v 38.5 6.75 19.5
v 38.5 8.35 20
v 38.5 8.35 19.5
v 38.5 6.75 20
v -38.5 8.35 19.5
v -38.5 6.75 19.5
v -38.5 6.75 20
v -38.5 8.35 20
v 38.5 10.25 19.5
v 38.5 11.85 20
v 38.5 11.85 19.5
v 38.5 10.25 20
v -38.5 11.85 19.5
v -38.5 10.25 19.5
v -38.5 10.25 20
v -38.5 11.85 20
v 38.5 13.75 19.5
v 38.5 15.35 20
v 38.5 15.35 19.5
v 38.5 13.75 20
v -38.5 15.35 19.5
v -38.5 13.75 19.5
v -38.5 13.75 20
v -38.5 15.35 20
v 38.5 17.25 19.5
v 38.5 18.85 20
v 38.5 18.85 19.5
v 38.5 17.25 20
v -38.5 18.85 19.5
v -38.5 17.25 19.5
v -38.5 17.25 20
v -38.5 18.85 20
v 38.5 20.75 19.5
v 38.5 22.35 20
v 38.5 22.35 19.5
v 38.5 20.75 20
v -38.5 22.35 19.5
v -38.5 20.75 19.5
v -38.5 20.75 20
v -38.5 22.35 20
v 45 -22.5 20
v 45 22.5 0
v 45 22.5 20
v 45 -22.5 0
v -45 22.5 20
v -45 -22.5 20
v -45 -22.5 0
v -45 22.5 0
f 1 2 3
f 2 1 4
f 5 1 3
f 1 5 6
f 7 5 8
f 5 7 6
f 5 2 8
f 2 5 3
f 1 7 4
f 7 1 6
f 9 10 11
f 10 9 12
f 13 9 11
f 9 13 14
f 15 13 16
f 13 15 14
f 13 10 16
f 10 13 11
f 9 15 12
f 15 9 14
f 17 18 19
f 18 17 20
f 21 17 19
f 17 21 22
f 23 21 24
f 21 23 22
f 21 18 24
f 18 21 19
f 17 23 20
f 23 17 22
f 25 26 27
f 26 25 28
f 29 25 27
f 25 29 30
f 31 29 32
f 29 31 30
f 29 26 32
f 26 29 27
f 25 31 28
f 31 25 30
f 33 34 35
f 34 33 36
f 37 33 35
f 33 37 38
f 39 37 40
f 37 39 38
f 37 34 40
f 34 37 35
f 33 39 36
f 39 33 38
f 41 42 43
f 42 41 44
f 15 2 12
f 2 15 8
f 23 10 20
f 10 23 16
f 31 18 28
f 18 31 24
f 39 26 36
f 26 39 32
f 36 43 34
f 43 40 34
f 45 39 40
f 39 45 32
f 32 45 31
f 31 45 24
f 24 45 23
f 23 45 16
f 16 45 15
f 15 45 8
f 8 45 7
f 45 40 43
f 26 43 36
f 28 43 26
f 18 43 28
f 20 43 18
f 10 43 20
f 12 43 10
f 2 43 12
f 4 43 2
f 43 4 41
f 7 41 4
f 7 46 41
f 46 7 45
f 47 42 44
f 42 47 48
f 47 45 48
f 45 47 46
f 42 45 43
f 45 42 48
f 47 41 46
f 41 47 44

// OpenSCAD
// Drying rack for 10 microscope slides
// Print orientation: base on XY plane, slots open at top (+Z)

$fn = 64;

// ---- Block dimensions ----
block_x = 90;        // block length (X)
block_y = 45;        // block width (Y)
block_z = 20;        // block height (Z)

// ---- Slot dimensions ----
slot_n     = 10;     // number of slots
slot_len   = 77;     // slot length along X
slot_w     = 1.6;    // slot width along Y
slot_depth = 10;     // slot depth from top face

// ---- Layout ----
slot_pitch = 3.5;    // centre-to-centre spacing (Y)
eps        = 0.5;    // overshoot for clean cuts

// Group of slots is centred on the block in X and Y
slot_y0 = block_y / 2 - (slot_n - 1) * slot_pitch / 2;

difference() {
    // Solid base block, centred in X/Y, resting on z = 0
    translate([-block_x / 2, -block_y / 2, 0])
        cube([block_x, block_y, block_z]);

    // 10 parallel slots, open at top
    for (i = [0 : slot_n - 1])
        translate([-slot_len / 2, slot_y0 + i * slot_pitch, block_z - eps])
            cube([slot_len, slot_w, slot_depth + eps]);
}
